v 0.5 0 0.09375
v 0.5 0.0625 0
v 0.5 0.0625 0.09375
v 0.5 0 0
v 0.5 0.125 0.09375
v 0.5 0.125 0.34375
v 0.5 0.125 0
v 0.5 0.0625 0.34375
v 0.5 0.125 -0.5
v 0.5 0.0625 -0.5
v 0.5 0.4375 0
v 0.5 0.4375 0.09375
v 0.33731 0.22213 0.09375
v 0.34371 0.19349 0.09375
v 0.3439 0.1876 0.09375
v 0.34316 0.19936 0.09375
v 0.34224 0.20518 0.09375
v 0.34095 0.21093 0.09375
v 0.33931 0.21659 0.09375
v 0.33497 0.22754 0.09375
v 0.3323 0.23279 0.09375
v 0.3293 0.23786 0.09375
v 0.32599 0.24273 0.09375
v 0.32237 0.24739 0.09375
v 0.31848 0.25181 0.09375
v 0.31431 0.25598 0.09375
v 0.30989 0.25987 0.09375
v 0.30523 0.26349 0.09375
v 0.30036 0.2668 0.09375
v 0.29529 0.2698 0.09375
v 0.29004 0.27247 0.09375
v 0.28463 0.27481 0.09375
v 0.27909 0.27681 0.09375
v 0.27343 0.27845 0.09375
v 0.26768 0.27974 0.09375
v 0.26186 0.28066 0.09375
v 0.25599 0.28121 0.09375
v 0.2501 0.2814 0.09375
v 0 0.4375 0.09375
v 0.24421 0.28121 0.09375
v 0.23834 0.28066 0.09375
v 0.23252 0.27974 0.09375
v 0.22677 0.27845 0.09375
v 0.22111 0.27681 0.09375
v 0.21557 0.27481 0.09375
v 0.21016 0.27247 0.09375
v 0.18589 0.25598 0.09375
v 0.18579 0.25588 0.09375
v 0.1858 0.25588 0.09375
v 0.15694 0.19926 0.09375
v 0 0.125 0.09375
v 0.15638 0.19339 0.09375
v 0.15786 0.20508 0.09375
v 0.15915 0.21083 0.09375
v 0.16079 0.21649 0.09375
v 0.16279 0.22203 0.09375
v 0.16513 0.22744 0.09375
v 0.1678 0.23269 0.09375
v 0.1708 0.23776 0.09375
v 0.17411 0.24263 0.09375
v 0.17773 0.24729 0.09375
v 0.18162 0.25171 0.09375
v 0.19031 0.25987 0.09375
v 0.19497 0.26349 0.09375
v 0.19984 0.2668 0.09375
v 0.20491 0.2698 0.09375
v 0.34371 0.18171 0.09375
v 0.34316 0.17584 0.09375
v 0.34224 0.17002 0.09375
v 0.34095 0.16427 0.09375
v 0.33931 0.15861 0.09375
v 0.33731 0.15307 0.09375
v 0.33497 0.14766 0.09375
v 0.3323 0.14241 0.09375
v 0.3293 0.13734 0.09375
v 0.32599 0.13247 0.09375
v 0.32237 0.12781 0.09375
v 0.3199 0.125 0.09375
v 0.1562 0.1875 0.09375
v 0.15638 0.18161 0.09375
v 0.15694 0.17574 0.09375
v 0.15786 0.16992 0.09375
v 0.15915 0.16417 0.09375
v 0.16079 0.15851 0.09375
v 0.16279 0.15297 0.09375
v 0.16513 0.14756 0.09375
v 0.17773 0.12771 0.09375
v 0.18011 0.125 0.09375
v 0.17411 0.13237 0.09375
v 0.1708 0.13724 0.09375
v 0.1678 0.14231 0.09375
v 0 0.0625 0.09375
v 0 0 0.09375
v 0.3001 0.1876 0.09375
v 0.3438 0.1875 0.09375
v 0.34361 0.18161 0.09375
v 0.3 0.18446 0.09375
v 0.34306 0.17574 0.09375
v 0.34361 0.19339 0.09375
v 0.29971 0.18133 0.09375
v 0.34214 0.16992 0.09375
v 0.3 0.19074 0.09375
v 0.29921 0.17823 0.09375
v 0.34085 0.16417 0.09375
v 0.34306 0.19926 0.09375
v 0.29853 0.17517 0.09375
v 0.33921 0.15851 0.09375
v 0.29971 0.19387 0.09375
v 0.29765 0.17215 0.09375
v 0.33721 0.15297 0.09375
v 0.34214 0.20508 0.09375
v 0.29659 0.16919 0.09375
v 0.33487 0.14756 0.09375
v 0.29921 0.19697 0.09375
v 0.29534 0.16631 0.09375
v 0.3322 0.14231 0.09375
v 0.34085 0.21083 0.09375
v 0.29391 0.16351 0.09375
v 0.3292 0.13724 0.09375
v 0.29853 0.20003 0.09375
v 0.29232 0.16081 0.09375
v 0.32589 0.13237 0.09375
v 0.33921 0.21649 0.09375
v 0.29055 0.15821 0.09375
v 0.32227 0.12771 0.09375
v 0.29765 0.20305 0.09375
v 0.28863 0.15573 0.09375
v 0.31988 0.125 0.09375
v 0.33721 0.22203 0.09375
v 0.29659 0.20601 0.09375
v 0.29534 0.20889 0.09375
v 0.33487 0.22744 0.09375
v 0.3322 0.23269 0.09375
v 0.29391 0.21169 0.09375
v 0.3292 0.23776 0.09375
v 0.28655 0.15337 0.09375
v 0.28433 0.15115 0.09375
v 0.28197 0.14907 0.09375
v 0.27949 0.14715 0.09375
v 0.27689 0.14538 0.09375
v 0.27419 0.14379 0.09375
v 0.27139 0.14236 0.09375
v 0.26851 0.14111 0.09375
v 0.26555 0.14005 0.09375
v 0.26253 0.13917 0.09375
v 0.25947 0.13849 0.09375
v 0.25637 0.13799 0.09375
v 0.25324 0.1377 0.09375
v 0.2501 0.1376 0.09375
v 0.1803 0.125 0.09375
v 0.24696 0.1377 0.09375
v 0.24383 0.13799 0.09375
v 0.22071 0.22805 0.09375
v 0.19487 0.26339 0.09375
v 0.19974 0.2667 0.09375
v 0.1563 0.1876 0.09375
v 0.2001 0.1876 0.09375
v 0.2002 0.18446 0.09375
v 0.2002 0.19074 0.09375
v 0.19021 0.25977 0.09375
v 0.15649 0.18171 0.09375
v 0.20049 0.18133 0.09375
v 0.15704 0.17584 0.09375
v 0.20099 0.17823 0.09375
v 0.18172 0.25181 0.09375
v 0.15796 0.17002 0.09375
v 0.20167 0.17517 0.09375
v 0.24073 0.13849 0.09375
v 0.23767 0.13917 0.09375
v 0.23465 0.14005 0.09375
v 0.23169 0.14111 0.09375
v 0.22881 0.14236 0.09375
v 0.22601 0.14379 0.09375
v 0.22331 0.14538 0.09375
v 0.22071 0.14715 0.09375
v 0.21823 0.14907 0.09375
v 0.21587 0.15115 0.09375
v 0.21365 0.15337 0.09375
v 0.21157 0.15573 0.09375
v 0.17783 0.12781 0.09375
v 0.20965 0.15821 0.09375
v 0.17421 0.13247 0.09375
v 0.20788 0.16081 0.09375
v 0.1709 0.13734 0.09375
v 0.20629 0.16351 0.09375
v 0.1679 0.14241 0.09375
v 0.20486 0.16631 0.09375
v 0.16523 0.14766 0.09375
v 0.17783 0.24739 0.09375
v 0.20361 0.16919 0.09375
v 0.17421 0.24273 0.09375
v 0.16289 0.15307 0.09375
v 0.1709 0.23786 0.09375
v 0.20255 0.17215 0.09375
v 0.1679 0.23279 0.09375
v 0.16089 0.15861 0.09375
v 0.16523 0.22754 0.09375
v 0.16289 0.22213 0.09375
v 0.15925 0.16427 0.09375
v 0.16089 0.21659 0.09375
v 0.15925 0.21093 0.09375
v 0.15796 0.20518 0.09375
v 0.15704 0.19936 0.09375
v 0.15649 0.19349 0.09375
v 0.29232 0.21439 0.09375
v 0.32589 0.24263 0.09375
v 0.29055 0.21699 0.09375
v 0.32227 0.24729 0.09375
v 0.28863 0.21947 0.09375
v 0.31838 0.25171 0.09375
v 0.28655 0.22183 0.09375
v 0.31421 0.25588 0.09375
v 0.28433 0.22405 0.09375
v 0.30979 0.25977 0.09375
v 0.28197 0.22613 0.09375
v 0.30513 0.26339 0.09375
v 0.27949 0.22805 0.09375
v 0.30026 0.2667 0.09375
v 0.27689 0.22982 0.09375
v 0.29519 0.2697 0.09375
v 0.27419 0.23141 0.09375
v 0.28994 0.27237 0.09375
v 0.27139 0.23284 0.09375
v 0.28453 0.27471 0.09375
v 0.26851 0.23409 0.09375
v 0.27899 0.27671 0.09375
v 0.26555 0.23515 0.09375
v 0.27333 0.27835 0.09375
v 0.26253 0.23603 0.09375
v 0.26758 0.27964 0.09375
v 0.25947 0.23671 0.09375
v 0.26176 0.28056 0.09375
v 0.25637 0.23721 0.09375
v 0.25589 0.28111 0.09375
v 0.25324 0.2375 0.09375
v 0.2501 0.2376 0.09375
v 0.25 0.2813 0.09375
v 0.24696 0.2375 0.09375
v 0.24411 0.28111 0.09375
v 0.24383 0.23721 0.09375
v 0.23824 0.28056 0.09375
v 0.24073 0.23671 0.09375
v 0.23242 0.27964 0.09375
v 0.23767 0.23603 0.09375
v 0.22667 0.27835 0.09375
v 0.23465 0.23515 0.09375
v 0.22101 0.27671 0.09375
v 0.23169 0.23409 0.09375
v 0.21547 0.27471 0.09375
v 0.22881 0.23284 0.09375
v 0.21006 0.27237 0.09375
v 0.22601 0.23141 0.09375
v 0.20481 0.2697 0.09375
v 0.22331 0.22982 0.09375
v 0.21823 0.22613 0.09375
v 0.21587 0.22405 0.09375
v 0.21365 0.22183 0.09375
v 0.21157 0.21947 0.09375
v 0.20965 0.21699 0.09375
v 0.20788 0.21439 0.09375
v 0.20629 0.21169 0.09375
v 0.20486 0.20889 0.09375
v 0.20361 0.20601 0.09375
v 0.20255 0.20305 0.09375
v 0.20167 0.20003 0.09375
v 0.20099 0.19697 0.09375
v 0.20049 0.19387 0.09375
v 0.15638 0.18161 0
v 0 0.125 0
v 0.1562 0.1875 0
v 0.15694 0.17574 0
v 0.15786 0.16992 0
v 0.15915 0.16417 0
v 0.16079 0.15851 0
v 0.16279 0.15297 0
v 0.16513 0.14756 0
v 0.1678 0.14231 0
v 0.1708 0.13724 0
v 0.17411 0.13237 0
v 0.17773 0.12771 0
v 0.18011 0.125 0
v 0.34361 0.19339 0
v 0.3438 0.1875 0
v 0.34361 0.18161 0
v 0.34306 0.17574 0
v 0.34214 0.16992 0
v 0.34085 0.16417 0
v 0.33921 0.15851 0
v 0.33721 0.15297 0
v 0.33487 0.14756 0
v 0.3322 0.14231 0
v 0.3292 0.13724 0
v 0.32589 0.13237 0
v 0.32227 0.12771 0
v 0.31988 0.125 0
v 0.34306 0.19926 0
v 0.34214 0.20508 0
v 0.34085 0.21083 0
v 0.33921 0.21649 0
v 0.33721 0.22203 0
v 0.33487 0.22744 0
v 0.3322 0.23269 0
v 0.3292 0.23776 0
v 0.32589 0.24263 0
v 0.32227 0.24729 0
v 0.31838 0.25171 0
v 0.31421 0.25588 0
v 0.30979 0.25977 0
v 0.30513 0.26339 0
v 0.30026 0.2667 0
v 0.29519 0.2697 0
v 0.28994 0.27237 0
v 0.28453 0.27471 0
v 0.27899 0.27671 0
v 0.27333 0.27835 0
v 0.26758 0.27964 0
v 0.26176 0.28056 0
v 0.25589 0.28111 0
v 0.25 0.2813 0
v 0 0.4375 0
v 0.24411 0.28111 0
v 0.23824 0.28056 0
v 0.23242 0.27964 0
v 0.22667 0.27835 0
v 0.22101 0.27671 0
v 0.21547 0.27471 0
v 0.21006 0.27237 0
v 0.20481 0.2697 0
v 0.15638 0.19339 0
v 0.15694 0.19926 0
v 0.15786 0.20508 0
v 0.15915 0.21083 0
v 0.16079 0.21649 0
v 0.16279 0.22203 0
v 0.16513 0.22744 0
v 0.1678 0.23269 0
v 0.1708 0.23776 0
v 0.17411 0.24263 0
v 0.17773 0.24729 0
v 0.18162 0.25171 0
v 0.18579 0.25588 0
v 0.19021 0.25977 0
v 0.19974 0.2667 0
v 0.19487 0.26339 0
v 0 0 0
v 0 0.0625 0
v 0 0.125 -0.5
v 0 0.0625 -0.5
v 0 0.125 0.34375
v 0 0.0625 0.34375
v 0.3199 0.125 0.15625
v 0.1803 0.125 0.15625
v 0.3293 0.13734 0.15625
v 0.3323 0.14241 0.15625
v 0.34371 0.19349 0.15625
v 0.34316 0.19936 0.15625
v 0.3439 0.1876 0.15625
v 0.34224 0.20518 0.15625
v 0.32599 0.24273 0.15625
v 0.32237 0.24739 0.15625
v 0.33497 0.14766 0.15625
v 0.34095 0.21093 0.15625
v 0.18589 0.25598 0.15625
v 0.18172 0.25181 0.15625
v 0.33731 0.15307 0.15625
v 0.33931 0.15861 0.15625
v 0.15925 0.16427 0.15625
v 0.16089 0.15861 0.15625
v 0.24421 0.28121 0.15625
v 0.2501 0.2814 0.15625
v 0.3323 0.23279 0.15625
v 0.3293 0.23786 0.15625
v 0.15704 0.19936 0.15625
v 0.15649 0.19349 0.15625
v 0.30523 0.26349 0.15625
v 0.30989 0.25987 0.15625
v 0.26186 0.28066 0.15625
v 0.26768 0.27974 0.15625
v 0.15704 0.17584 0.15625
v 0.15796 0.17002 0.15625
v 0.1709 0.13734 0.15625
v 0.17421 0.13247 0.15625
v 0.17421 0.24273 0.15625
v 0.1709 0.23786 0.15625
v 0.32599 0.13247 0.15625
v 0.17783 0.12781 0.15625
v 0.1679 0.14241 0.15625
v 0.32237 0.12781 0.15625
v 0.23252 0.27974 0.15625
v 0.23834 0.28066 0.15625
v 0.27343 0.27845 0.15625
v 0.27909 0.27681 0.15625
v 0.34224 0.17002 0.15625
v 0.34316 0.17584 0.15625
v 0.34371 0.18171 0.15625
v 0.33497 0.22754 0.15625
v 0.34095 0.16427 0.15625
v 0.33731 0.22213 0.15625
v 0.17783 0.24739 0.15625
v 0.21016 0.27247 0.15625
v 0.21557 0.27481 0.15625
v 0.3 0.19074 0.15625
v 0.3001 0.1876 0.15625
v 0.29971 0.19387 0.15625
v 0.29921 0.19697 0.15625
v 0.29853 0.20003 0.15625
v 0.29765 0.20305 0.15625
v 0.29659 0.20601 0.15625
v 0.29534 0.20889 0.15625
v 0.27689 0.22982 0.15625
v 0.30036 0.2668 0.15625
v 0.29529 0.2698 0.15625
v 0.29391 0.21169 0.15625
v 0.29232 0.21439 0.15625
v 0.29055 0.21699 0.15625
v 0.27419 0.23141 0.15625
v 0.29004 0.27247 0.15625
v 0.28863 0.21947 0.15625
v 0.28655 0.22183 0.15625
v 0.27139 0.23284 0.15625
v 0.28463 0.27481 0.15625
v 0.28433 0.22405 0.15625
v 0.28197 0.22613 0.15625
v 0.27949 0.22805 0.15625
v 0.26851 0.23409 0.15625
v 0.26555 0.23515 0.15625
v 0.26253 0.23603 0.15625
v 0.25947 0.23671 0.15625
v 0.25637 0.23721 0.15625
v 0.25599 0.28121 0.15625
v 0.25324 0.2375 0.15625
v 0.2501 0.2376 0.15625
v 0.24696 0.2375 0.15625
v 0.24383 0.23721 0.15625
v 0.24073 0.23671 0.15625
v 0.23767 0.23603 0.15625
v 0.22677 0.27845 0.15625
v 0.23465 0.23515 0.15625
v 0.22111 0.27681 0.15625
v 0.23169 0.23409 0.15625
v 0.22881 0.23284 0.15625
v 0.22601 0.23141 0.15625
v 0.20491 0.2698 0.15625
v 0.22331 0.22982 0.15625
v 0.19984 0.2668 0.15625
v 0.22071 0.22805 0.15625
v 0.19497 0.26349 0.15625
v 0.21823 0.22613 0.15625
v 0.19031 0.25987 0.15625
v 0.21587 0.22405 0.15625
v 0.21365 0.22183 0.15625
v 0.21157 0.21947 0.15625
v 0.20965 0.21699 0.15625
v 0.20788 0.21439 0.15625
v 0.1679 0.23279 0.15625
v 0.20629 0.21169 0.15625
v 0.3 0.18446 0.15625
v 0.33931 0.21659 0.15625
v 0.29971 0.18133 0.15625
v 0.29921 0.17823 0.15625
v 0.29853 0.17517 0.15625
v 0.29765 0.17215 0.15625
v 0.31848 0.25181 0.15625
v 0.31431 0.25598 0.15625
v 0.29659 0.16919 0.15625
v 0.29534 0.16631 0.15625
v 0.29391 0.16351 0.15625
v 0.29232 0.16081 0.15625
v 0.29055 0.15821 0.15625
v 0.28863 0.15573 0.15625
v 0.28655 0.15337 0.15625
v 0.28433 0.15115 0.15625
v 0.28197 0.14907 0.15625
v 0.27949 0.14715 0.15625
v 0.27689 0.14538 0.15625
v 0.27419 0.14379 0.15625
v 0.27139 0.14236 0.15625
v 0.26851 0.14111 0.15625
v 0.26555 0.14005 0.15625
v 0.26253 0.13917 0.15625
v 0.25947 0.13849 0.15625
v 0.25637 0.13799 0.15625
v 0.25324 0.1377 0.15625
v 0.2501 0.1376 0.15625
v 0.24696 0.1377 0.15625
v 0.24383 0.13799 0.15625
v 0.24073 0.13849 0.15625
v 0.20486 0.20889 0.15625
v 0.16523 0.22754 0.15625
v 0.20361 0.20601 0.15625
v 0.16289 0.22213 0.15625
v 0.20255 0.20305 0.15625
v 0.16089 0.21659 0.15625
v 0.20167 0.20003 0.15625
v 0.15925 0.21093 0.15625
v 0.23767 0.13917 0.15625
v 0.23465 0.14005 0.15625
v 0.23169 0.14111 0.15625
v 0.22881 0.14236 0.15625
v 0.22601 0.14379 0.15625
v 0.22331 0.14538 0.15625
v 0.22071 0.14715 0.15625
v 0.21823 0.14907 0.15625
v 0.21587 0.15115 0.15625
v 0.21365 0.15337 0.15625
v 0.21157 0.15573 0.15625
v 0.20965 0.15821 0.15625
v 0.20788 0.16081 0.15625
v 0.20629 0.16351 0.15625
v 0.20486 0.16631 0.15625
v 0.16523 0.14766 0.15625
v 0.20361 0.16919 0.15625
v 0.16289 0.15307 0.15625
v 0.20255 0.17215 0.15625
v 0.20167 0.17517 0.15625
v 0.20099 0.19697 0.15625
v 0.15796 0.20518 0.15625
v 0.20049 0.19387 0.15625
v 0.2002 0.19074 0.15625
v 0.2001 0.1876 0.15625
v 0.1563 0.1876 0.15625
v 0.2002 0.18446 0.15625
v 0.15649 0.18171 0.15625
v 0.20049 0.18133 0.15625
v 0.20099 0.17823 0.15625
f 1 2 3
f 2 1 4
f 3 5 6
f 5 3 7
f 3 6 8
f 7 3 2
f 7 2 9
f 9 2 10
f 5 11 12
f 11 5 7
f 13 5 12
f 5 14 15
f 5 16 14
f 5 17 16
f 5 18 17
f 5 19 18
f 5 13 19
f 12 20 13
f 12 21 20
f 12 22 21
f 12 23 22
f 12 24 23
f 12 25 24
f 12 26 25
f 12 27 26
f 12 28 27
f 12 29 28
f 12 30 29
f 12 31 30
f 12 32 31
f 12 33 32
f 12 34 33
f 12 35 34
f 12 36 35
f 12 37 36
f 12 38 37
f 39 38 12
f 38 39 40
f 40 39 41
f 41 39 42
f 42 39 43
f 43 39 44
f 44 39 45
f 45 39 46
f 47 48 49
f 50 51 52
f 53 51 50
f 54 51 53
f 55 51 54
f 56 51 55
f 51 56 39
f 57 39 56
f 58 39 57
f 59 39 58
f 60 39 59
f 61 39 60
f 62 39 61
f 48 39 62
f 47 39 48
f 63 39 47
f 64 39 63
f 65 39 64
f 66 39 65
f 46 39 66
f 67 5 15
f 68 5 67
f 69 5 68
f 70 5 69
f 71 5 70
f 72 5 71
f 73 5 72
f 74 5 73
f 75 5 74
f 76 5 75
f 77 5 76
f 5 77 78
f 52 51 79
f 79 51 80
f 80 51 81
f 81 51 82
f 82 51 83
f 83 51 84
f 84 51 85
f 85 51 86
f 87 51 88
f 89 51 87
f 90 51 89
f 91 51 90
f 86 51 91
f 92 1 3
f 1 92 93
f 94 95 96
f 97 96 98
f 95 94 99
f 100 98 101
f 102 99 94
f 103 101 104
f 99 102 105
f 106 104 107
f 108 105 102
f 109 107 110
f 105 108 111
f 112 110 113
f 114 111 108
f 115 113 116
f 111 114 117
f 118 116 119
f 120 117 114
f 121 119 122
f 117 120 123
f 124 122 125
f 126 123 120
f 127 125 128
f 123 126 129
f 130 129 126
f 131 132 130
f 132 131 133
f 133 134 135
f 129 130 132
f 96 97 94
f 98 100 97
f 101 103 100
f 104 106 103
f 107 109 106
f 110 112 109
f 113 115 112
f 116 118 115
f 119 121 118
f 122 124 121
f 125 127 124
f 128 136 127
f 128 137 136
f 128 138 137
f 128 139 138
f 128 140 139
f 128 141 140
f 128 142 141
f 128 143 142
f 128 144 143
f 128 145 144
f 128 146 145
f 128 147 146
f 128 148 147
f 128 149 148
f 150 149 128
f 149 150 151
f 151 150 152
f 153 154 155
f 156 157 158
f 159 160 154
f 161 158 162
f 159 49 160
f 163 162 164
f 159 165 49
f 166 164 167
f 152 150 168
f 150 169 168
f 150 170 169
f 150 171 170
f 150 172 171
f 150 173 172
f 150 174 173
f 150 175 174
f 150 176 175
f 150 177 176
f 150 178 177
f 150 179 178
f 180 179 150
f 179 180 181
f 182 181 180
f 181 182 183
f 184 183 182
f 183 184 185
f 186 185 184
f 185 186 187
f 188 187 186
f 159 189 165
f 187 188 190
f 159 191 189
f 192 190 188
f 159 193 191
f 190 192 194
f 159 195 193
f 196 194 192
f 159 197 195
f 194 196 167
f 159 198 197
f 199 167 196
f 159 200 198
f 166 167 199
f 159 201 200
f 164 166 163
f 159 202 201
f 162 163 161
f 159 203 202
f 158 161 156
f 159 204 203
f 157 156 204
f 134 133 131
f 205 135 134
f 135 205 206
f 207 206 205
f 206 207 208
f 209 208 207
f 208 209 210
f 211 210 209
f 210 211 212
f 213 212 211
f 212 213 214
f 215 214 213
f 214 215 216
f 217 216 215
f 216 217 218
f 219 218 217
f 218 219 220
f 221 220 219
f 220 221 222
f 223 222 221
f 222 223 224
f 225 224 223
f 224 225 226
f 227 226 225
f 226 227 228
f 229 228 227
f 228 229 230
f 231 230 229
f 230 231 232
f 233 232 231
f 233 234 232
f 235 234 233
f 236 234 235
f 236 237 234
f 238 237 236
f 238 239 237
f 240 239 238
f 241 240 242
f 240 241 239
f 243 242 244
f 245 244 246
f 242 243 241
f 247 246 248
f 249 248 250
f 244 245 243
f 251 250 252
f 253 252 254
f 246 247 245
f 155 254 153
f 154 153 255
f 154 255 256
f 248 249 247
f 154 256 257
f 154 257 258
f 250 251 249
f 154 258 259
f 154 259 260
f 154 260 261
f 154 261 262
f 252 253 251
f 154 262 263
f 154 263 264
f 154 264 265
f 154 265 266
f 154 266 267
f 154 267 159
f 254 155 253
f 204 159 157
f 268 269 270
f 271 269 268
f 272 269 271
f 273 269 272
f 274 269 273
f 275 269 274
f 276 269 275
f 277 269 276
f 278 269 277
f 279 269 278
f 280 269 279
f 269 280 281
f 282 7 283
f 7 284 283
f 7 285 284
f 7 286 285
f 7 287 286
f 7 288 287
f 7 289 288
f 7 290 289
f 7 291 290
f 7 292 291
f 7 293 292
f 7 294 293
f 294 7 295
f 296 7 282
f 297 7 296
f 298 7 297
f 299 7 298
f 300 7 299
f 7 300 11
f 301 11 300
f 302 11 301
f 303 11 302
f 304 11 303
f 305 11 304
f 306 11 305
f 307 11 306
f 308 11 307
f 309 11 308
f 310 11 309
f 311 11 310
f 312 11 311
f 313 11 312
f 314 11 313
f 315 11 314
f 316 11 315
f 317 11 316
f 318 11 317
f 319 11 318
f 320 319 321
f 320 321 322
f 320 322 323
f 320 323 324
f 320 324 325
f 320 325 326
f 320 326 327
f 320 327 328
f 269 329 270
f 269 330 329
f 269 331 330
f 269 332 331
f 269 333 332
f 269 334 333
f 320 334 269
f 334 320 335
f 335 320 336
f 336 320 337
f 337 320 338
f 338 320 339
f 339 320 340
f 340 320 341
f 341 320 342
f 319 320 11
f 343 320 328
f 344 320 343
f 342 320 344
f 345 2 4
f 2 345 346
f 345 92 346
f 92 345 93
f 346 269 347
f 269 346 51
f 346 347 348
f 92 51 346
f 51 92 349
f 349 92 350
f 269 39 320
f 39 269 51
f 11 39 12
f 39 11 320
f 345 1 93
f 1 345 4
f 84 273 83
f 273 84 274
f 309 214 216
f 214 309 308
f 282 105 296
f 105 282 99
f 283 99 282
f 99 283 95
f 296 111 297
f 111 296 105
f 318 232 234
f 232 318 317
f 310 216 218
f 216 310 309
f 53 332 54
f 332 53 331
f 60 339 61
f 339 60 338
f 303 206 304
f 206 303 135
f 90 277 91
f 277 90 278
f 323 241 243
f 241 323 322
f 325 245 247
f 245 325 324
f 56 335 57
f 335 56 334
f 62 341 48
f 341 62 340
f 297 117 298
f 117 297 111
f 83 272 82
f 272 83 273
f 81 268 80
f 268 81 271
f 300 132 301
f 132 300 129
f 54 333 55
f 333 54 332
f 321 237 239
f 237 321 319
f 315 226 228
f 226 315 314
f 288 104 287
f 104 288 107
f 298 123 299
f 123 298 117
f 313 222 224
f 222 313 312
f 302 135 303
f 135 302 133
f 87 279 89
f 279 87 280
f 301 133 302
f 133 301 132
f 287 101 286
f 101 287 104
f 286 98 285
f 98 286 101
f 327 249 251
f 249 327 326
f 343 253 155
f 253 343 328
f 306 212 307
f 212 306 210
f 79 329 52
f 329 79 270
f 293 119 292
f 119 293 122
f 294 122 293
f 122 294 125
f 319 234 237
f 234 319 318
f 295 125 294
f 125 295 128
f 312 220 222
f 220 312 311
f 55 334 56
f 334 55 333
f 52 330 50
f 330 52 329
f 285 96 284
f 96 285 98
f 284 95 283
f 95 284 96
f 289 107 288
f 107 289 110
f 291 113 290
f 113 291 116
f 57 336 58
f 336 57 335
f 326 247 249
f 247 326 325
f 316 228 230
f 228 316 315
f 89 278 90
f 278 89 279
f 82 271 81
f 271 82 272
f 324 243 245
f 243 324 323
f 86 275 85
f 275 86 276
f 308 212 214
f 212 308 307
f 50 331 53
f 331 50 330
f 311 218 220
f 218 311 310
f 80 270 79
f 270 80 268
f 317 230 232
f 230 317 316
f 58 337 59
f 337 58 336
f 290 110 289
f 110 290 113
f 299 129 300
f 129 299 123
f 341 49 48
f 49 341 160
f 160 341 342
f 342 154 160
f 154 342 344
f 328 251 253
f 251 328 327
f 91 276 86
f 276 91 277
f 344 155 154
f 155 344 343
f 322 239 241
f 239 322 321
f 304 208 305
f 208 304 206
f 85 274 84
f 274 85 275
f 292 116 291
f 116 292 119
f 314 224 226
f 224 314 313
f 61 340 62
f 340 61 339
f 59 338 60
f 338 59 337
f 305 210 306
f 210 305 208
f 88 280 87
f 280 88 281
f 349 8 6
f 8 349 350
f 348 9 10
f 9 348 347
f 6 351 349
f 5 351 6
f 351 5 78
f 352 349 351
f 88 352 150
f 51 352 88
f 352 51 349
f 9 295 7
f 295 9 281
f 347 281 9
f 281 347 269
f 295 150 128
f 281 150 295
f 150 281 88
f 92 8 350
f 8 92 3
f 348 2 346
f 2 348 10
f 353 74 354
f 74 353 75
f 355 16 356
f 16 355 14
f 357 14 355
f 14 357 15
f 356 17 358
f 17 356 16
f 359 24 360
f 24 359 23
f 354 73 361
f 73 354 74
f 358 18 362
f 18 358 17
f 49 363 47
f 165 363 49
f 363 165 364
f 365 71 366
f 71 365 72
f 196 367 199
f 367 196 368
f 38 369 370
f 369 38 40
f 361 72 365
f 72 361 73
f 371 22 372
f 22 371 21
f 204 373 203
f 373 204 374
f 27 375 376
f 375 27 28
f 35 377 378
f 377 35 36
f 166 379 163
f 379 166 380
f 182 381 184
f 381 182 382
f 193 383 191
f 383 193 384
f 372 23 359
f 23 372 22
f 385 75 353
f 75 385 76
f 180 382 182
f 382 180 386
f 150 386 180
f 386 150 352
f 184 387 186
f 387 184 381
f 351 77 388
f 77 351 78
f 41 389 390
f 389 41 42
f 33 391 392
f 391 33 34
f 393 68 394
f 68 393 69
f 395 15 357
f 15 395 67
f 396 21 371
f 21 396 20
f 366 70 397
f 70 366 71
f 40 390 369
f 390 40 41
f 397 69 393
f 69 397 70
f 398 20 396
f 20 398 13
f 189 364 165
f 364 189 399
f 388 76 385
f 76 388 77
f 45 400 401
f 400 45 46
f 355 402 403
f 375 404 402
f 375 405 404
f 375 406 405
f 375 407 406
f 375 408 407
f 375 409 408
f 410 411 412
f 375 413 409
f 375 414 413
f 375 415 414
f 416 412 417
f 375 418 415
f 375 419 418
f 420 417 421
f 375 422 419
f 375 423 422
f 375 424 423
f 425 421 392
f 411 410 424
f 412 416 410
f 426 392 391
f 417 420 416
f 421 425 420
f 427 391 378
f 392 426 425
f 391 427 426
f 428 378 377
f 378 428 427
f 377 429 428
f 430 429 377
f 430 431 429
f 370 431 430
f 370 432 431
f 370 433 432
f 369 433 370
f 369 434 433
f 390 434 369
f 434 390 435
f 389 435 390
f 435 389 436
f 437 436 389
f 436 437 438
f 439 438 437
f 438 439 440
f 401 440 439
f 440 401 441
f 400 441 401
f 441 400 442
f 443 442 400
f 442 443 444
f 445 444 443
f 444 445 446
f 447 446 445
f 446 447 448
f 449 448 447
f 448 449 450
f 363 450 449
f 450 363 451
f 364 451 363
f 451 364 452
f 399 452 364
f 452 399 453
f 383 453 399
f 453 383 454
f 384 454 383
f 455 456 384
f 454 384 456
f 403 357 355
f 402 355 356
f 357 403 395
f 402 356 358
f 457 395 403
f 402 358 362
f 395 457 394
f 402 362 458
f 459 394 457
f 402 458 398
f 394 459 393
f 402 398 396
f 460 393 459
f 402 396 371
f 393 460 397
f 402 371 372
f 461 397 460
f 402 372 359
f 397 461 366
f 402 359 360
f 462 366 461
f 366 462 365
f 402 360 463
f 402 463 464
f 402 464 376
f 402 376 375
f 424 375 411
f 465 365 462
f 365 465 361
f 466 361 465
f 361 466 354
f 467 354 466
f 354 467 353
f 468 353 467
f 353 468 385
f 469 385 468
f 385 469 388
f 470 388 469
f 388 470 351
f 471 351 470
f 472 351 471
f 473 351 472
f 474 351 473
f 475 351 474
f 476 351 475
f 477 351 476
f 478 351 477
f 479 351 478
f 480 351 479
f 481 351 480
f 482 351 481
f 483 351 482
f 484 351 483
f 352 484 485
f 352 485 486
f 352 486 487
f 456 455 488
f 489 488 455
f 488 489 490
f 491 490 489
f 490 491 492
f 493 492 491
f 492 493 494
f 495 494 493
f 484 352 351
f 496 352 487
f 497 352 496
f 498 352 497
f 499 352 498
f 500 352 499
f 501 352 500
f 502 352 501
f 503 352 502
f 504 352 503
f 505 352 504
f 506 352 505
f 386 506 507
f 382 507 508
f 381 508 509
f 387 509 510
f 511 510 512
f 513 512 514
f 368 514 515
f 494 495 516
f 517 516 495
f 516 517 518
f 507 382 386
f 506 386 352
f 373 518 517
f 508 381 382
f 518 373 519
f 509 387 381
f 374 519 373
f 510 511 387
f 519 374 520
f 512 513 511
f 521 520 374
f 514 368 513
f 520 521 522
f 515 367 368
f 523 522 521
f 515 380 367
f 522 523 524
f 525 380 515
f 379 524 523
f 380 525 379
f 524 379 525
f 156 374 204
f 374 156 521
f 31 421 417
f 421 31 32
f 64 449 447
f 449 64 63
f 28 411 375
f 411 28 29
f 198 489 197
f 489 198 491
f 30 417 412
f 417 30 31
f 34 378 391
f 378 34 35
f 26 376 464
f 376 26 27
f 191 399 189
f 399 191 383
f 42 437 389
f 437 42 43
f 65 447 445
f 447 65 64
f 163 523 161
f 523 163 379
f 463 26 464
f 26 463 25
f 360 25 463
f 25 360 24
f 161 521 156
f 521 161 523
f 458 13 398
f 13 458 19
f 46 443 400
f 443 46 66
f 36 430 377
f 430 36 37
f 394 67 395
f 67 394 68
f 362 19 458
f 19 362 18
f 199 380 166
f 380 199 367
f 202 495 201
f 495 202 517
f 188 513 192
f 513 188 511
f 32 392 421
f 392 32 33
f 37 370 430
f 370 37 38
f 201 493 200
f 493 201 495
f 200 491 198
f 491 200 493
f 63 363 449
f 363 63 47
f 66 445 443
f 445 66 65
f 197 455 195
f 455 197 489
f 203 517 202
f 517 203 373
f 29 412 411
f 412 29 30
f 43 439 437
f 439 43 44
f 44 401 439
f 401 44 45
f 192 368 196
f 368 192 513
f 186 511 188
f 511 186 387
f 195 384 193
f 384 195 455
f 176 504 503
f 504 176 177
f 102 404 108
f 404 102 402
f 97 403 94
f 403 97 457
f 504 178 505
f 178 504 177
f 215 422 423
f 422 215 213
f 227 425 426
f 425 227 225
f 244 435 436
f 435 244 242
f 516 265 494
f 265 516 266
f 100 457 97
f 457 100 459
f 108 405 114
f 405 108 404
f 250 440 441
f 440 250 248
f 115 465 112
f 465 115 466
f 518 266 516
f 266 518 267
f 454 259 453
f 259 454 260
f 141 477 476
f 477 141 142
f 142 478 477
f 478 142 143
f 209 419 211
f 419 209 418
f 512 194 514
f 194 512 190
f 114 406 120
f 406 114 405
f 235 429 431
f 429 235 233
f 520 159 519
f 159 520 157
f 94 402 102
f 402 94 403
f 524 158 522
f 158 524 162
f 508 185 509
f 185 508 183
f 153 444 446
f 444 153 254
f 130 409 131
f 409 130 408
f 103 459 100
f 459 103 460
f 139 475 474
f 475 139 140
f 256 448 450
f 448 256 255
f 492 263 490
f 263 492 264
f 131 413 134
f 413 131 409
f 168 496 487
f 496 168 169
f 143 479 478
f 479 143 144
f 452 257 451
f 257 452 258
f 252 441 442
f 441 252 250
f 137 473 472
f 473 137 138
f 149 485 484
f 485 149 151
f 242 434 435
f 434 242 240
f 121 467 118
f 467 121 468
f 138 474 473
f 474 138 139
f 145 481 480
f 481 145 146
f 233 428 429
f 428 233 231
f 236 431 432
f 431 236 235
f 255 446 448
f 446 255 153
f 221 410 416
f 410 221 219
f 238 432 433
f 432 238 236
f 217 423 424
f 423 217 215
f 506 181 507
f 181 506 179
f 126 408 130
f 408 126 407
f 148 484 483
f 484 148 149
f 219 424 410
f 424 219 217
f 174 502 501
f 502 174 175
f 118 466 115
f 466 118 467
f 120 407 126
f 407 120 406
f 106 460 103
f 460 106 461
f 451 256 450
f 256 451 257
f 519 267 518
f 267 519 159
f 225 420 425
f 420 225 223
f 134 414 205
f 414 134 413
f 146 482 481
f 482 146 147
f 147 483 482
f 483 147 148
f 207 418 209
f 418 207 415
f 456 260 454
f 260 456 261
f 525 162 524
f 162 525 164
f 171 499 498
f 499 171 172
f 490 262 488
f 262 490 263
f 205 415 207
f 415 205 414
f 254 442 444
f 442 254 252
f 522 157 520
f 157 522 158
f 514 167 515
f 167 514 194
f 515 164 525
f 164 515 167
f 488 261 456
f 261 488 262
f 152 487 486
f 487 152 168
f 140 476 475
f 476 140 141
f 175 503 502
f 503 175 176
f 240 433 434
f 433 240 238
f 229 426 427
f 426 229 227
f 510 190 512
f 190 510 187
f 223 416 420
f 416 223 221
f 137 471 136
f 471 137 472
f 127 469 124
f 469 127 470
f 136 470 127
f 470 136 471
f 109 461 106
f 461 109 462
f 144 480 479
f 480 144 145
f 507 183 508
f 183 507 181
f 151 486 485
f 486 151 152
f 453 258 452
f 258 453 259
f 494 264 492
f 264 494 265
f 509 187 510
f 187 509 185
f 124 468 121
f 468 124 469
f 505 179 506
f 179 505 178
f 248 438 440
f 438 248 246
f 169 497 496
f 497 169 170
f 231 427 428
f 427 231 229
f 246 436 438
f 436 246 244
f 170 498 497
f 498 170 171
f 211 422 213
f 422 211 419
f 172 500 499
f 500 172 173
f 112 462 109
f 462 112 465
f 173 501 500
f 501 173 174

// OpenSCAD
// Parametric CAD Model
// All dimensions in millimeters

// --- Main Parameters ---
base_length = 0.5;
base_width = 0.4375;
base_height = 0.09375;
base_extrusion = 0.0938;

// --- Base Hole Parameters ---
hole_center_x = 0.25;
hole_center_y = 0.1875;
hole_radius = 0.0938;

// --- Lower Back Strip Parameters ---
lower_strip_width = 0.0625;
lower_strip_front_offset = 0.375;
lower_strip_height_below = 0.25;

// --- Upper Back Strip Parameters ---
upper_strip_width = 0.0625;
upper_strip_front_offset = 0.375;
upper_strip_height_below = 0.5;
upper_strip_height_above = 0.25;

// --- Upper Strip Void Parameters ---
void_center_x = 0.125;
void_center_y = 0.4375;
void_radius = 0.05;

// --- Annular Collar Parameters ---
collar_center_x = 0.2501;
collar_center_y = 0.1876;
collar_outer_radius = 0.0938;
collar_inner_radius = 0.05;
collar_height = 0.0625;

// Resolution for smooth curves
$fn = 100;

// --- Main Model Construction ---
union() {
    // 1. Main rectangular base with circular void
    difference() {
        // Base solid
        cube([base_length, base_width, base_height]);
        
        // Circular void through base
        translate([hole_center_x, hole_center_y, -0.001])
            cylinder(h = base_height + 0.002, r = hole_radius);
    }
    
    // 2. Lower back-edge strip (extends below base)
    translate([0, base_width - lower_strip_front_offset, -lower_strip_height_below])
        cube([base_length, lower_strip_width, lower_strip_height_below]);
    
    // 3. Upper back-edge strip with circular voids
    difference() {
        // Upper strip solid
        translate([0, base_width - upper_strip_front_offset, -upper_strip_height_below])
            cube([base_length, upper_strip_width, 
                  upper_strip_height_below + base_height + upper_strip_height_above]);
        
        // Circular voids in upper strip
        for (z_offset = [-upper_strip_height_below : 0.1 : base_height + upper_strip_height_above]) {
            translate([void_center_x, void_center_y, z_offset])
                cylinder(h = 0.11, r = void_radius, center = true);
        }
    }
    
    // 4. Annular collar on upper side
    translate([collar_center_x, collar_center_y, base_height]) {
        difference() {
            // Outer cylinder
            cylinder(h = collar_height, r = collar_outer_radius);
            
            // Inner cylinder (creates annular shape)
            translate([0, 0, -0.001])
                cylinder(h = collar_height + 0.002, r = collar_inner_radius);
        }
    }
}
